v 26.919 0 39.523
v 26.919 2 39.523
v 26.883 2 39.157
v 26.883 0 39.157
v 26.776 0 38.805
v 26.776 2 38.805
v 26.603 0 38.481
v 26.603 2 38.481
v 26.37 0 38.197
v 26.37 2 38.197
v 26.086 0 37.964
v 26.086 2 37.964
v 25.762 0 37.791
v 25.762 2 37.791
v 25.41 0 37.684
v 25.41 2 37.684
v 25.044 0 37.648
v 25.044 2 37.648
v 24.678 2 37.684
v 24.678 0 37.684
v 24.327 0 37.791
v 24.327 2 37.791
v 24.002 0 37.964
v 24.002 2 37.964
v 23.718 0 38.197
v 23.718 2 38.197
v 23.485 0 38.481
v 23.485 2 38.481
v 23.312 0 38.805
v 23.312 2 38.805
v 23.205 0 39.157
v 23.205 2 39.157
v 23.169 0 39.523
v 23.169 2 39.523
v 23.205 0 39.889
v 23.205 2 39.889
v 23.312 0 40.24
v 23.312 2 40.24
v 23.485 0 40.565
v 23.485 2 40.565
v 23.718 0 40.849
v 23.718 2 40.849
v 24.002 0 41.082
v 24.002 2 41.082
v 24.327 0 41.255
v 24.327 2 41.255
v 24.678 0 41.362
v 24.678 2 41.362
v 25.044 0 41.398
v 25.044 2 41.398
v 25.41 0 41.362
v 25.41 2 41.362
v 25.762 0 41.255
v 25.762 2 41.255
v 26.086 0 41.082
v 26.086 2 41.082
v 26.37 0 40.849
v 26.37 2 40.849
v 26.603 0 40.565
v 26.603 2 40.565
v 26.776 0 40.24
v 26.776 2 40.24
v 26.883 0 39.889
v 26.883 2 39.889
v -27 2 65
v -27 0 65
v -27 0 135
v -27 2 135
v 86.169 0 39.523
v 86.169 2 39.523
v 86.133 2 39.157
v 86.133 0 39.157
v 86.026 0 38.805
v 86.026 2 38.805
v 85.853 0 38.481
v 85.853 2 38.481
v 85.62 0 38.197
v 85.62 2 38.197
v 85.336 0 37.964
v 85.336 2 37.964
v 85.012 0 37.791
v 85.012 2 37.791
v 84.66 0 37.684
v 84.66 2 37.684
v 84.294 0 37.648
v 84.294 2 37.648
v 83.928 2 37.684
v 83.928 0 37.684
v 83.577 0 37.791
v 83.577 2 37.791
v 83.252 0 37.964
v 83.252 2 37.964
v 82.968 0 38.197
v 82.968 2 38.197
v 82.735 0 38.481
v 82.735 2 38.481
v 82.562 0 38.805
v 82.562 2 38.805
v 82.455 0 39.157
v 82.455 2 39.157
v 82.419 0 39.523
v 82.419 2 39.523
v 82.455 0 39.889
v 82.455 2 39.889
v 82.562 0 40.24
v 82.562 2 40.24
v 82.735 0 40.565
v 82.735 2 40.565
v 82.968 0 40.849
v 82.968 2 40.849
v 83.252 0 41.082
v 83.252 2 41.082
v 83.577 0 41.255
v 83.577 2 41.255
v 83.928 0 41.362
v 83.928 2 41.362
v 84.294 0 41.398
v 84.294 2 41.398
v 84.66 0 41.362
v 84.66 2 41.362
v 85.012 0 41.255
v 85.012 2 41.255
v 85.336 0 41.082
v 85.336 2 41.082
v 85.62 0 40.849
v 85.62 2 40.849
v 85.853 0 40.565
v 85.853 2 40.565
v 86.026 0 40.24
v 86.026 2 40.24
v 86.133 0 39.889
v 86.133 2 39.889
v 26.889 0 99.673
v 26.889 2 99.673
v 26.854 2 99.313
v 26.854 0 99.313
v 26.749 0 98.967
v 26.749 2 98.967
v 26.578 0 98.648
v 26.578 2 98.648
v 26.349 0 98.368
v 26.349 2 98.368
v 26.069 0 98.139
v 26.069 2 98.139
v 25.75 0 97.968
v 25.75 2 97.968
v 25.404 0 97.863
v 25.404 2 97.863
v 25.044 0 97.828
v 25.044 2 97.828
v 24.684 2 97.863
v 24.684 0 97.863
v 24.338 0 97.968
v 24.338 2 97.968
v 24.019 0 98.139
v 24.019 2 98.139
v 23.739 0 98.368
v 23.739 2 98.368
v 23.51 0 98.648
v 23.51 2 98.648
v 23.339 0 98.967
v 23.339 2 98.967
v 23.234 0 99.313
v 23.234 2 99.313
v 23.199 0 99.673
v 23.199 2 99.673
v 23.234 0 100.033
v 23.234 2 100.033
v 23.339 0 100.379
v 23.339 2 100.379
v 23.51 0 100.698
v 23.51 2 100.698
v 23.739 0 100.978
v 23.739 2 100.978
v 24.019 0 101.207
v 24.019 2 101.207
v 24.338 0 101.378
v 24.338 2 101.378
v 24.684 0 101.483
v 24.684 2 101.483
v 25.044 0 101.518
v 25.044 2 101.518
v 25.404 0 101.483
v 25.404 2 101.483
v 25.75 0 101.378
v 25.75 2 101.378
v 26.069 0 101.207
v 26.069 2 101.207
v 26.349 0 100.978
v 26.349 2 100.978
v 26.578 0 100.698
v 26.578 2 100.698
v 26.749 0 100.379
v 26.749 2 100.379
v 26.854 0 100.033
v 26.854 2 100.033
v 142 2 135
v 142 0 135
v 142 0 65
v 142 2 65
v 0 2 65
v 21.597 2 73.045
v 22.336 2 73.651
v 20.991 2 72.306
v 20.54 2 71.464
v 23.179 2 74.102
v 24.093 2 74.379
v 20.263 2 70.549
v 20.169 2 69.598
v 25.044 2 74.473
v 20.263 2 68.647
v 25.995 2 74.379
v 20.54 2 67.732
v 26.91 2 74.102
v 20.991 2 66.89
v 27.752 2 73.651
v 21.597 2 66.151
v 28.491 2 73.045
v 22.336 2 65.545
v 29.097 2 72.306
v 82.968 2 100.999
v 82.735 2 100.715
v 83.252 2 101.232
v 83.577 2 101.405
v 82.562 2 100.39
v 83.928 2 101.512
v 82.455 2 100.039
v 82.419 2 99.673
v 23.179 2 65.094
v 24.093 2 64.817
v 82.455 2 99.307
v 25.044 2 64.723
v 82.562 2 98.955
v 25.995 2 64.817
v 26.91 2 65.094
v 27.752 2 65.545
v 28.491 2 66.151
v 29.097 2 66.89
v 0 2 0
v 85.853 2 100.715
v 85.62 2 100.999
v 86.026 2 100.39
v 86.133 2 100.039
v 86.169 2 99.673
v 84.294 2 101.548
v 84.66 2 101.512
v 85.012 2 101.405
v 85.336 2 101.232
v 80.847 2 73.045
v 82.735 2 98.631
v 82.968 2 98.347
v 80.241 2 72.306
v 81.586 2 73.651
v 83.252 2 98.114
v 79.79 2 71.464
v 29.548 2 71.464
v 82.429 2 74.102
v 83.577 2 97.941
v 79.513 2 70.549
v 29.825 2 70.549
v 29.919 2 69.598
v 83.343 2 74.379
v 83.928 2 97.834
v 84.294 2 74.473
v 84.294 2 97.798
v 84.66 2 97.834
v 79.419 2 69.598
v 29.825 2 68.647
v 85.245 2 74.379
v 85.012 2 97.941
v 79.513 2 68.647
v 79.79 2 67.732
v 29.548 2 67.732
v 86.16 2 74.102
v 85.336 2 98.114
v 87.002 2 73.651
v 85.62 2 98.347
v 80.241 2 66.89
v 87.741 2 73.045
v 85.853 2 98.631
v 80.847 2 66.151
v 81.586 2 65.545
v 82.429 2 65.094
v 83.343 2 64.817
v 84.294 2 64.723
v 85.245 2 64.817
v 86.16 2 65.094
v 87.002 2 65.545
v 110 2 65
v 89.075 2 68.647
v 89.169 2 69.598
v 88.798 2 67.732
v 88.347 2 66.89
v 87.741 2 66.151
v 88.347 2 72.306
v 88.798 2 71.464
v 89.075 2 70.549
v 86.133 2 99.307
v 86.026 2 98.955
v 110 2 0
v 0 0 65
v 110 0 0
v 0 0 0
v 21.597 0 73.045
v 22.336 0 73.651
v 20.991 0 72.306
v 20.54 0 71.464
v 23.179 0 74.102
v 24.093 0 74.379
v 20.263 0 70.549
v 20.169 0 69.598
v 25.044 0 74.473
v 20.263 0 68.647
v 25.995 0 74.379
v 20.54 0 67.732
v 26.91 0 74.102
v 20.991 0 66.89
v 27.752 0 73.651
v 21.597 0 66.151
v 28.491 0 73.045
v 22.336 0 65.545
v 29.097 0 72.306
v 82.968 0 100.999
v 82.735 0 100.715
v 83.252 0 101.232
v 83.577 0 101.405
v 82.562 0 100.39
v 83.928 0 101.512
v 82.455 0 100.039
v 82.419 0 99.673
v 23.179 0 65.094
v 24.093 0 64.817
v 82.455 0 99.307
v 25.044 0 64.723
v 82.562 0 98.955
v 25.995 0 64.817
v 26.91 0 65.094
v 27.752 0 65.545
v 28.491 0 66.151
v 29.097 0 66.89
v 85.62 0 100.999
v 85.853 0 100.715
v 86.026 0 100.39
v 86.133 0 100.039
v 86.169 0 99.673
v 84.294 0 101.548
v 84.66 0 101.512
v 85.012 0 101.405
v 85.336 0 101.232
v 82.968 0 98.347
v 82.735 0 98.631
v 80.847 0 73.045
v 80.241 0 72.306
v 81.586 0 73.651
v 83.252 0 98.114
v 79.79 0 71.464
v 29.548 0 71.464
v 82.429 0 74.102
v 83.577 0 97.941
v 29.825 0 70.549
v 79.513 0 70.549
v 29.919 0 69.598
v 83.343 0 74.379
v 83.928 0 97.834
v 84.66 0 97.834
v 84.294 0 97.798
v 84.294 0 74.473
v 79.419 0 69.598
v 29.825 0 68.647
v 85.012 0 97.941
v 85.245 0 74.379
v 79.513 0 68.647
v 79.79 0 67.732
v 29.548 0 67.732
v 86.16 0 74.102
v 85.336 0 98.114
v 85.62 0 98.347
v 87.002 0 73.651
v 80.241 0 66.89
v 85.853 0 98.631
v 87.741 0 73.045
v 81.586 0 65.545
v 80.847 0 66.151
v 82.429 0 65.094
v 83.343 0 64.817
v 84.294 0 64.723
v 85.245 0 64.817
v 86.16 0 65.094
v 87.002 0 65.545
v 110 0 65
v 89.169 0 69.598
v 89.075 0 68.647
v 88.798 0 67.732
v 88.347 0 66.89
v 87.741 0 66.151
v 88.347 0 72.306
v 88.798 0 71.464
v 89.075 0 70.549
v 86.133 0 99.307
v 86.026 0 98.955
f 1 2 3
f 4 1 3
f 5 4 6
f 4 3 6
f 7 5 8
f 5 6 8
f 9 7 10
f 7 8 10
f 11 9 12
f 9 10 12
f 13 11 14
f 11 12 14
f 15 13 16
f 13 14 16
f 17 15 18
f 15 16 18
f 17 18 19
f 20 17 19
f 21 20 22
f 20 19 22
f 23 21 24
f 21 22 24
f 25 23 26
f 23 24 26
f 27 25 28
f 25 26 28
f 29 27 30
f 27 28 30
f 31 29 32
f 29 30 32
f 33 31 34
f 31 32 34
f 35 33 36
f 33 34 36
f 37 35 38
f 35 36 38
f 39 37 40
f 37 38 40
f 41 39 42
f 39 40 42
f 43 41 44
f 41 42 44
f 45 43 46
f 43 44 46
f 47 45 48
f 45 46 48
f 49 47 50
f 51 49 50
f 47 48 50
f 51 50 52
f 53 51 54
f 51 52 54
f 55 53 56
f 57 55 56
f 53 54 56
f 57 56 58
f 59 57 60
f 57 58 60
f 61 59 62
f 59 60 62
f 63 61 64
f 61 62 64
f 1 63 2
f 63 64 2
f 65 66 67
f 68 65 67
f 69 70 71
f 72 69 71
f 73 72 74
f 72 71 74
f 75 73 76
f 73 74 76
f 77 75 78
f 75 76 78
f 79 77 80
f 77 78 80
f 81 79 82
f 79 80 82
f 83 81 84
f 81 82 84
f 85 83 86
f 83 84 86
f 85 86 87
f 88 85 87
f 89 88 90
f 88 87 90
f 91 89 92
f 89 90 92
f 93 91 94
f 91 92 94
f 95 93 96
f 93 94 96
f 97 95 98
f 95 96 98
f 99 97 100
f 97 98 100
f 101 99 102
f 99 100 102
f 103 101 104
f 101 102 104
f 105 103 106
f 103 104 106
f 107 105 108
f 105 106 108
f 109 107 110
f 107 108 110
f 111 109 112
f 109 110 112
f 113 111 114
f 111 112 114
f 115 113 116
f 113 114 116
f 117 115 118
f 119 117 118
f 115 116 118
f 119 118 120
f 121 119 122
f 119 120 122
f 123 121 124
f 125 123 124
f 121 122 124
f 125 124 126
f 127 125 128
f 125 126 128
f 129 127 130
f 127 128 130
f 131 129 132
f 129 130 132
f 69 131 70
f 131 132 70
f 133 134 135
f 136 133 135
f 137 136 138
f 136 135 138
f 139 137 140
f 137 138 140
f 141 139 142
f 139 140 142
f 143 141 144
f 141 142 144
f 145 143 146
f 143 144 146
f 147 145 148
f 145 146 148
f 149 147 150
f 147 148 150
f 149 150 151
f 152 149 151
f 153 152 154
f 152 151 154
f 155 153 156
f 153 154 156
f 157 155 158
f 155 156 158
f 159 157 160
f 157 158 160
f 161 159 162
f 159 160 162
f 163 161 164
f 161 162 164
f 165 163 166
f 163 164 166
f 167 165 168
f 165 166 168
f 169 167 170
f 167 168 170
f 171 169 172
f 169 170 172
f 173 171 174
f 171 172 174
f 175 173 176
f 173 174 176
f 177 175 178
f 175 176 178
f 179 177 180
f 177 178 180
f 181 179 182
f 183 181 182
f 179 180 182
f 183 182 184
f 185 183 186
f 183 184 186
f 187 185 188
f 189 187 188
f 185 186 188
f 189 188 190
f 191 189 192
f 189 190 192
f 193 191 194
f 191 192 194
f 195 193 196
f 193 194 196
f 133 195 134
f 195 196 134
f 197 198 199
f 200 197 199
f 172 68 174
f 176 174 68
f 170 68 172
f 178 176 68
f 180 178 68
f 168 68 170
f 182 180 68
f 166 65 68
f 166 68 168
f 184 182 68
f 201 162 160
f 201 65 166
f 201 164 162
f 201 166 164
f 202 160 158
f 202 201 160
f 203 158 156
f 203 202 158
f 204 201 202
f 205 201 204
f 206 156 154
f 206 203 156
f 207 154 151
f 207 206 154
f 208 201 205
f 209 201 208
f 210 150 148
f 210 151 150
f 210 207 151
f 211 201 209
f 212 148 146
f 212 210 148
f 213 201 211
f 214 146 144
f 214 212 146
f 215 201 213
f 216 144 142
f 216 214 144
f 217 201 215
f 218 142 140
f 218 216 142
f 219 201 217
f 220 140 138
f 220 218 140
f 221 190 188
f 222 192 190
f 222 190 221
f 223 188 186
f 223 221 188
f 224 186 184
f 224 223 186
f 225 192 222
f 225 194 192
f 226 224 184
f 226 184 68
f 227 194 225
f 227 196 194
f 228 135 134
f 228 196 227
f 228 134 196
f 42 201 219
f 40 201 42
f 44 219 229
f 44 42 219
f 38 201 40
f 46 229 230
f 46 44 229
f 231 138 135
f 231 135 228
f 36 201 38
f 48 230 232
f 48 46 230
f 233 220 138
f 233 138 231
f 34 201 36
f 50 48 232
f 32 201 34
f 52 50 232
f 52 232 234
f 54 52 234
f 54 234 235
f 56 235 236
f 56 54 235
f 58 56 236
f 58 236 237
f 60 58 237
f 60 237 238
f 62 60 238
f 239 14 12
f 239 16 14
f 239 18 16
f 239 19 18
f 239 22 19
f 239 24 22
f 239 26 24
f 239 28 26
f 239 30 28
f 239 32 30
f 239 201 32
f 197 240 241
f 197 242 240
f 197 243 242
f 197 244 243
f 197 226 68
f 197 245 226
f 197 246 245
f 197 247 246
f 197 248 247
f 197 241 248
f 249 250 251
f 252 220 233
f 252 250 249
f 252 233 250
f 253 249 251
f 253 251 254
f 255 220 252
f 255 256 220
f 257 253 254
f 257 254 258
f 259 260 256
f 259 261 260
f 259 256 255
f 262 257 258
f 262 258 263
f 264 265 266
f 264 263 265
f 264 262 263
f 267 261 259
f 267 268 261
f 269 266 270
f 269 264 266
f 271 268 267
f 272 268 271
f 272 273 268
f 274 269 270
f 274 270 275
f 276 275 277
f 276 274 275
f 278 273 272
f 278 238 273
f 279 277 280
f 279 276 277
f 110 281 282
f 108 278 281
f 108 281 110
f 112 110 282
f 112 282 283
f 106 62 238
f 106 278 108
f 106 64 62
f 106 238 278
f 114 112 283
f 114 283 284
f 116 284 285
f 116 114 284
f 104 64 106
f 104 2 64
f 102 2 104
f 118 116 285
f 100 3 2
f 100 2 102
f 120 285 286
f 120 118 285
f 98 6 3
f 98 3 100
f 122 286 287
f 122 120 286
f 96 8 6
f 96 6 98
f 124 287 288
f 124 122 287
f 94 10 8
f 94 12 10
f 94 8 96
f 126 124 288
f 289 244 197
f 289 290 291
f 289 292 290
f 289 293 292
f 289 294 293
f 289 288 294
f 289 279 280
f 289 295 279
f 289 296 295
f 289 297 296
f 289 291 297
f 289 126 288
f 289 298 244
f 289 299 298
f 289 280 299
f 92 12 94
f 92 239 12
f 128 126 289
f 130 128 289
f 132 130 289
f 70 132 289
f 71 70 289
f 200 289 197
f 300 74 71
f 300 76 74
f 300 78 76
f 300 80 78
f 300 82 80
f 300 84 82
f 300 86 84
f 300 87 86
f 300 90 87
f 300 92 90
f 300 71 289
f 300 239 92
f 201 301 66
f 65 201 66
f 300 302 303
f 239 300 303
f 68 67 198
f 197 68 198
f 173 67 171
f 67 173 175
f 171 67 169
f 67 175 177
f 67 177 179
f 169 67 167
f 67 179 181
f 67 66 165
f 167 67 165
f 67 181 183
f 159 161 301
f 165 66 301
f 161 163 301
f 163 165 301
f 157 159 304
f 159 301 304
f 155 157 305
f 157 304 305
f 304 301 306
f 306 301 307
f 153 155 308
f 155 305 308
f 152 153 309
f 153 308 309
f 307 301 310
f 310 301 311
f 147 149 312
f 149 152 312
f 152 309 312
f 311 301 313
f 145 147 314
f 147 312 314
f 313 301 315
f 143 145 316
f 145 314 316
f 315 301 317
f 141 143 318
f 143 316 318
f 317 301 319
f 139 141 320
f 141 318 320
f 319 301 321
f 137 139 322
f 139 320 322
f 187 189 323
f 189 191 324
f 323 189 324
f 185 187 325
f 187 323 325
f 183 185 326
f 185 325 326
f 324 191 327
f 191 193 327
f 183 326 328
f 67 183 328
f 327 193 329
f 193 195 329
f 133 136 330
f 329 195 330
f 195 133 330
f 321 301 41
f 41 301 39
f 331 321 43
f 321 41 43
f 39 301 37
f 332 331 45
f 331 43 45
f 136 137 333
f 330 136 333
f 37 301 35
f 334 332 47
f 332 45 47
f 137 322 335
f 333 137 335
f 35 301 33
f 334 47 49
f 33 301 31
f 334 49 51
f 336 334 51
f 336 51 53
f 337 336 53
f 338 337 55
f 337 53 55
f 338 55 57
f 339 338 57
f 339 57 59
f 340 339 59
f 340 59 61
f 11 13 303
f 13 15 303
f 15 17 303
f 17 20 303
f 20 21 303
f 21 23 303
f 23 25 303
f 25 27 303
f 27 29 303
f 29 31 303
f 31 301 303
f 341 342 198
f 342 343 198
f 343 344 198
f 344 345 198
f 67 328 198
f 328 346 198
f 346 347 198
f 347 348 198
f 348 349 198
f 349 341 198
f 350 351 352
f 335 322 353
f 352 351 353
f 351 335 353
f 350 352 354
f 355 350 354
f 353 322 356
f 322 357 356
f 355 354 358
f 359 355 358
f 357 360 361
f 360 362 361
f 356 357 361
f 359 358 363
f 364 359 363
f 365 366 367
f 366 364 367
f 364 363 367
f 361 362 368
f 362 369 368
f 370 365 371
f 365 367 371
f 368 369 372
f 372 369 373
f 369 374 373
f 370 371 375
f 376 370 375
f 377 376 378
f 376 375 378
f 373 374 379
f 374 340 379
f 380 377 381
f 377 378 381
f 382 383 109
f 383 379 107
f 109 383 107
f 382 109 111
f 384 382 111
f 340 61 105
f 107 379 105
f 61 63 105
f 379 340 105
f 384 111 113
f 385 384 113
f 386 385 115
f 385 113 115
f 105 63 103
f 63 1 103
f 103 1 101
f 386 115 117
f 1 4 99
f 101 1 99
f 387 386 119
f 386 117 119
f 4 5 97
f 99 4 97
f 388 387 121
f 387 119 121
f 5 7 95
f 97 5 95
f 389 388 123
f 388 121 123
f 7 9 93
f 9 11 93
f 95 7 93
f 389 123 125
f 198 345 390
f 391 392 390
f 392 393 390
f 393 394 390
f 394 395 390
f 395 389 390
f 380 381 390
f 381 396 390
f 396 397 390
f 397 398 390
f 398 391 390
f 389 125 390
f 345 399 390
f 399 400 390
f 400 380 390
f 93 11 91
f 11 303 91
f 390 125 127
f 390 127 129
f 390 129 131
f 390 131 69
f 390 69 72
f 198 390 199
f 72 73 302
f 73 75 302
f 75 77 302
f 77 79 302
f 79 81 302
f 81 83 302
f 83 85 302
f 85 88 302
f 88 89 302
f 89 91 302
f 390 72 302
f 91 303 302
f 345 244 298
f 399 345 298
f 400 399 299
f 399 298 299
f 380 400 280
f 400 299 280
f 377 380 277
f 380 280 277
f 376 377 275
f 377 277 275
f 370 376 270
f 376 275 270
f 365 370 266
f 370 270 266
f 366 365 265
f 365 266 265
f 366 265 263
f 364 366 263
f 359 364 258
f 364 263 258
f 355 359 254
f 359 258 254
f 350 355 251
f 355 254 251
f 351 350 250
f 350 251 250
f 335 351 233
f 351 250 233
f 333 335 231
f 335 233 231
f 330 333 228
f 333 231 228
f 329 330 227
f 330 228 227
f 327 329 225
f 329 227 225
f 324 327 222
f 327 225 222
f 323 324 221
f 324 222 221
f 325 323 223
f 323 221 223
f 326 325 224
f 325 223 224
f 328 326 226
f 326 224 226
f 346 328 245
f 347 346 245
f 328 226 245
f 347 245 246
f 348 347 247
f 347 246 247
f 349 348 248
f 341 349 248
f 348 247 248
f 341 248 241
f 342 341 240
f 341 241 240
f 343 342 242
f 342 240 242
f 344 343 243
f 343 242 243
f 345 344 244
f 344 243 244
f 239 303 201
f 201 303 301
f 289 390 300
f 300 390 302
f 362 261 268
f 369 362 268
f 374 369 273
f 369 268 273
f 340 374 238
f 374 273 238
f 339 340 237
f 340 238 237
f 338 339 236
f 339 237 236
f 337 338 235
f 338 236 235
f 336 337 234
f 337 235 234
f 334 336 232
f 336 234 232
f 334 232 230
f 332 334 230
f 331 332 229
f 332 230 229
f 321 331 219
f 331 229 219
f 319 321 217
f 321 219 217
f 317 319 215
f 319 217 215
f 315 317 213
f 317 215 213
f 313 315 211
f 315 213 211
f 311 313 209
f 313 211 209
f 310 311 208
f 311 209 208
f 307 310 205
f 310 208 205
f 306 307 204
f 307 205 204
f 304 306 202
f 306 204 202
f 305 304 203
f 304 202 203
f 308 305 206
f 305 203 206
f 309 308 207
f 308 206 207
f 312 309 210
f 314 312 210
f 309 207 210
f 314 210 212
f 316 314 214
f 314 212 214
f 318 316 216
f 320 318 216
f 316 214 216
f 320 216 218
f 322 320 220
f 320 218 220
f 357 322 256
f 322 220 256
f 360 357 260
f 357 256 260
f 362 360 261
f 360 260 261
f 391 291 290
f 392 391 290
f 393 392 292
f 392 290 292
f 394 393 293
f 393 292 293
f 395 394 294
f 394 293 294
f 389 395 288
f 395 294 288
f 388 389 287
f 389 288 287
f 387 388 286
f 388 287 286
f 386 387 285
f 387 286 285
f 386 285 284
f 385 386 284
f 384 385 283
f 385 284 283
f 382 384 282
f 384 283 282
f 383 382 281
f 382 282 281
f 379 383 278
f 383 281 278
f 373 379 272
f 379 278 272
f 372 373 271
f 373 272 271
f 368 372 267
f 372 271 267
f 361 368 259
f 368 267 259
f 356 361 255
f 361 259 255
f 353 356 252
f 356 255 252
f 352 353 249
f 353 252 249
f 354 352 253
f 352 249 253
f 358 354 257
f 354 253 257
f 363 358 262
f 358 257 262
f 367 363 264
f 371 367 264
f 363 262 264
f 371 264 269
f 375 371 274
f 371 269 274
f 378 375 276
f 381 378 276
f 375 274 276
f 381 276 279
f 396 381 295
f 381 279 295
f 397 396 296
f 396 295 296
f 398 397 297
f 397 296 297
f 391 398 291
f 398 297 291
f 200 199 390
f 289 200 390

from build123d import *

# Parameters (mm, degrees)
AUFSATZ_LINEAR_AUSTRAGEN1_DEPTH = 2
SKIZZE2_R                       = 4.875
SCHNITT_LINEAR_AUSTRAGEN1_DEPTH = 2
SKIZZE3_R                       = 4.875
SCHNITT_LINEAR_AUSTRAGEN2_DEPTH = 2
SKIZZE4_R                       = 1.875
SCHNITT_LINEAR_AUSTRAGEN3_DEPTH = 2
SKIZZE5_R                       = 1.845307759
SCHNITT_LINEAR_AUSTRAGEN4_DEPTH = 2
SKIZZE6_R                       = 1.875
SCHNITT_LINEAR_AUSTRAGEN5_DEPTH = 2
SKIZZE7_R                       = 1.875
SCHNITT_LINEAR_AUSTRAGEN6_DEPTH = 2


with BuildPart() as part:
    # Skizze1 → Aufsatz-Linear austragen1 (new body)
    with BuildSketch(Plane(origin=(0, 0, 0), x_dir=(1, 0, 0), z_dir=(0, 1, 0))):
        Polygon((142, -65), (110, -65), (110, 0), (0, 0), (0, -65), (-27, -65), (-27, -135), (142, -135), align=None)
    extrude(amount=AUFSATZ_LINEAR_AUSTRAGEN1_DEPTH)

    # Skizze2 → Schnitt-Linear austragen1 (cut)
    with BuildSketch(Plane(origin=(0, 2, 0), x_dir=(1, 0, 0), z_dir=(0, 1, 0))):
        with Locations((25.044083651, -69.597933498)):
            Circle(SKIZZE2_R)
    extrude(amount=-SCHNITT_LINEAR_AUSTRAGEN1_DEPTH, mode=Mode.SUBTRACT)

    # Skizze3 → Schnitt-Linear austragen2 (cut)
    with BuildSketch(Plane(origin=(0, 2, 0), x_dir=(1, 0, 0), z_dir=(0, 1, 0))):
        with Locations((84.294083651, -69.597933498)):
            Circle(SKIZZE3_R)
    extrude(amount=-SCHNITT_LINEAR_AUSTRAGEN2_DEPTH, mode=Mode.SUBTRACT)

    # Skizze4 → Schnitt-Linear austragen3 (cut)
    with BuildSketch(Plane(origin=(0, 2, 0), x_dir=(1, 0, 0), z_dir=(0, 1, 0))):
        with Locations((84.294083651, -99.672933498)):
            Circle(SKIZZE4_R)
    extrude(amount=-SCHNITT_LINEAR_AUSTRAGEN3_DEPTH, mode=Mode.SUBTRACT)

    # Skizze5 → Schnitt-Linear austragen4 (cut)
    with BuildSketch(Plane(origin=(0, 2, 0), x_dir=(1, 0, 0), z_dir=(0, 1, 0))):
        with Locations((25.044083651, -99.672933498)):
            Circle(SKIZZE5_R)
    extrude(amount=-SCHNITT_LINEAR_AUSTRAGEN4_DEPTH, mode=Mode.SUBTRACT)

    # Skizze6 → Schnitt-Linear austragen5 (cut)
    with BuildSketch(Plane(origin=(0, 2, 0), x_dir=(1, 0, 0), z_dir=(0, 1, 0))):
        with Locations((84.294083651, -39.522933498)):
            Circle(SKIZZE6_R)
    extrude(amount=-SCHNITT_LINEAR_AUSTRAGEN5_DEPTH, mode=Mode.SUBTRACT)

    # Skizze7 → Schnitt-Linear austragen6 (cut)
    with BuildSketch(Plane(origin=(0, 2, 0), x_dir=(1, 0, 0), z_dir=(0, 1, 0))):
        with Locations((25.044083651, -39.522933498)):
            Circle(SKIZZE7_R)
    extrude(amount=-SCHNITT_LINEAR_AUSTRAGEN6_DEPTH, mode=Mode.SUBTRACT)


solid = part.part
